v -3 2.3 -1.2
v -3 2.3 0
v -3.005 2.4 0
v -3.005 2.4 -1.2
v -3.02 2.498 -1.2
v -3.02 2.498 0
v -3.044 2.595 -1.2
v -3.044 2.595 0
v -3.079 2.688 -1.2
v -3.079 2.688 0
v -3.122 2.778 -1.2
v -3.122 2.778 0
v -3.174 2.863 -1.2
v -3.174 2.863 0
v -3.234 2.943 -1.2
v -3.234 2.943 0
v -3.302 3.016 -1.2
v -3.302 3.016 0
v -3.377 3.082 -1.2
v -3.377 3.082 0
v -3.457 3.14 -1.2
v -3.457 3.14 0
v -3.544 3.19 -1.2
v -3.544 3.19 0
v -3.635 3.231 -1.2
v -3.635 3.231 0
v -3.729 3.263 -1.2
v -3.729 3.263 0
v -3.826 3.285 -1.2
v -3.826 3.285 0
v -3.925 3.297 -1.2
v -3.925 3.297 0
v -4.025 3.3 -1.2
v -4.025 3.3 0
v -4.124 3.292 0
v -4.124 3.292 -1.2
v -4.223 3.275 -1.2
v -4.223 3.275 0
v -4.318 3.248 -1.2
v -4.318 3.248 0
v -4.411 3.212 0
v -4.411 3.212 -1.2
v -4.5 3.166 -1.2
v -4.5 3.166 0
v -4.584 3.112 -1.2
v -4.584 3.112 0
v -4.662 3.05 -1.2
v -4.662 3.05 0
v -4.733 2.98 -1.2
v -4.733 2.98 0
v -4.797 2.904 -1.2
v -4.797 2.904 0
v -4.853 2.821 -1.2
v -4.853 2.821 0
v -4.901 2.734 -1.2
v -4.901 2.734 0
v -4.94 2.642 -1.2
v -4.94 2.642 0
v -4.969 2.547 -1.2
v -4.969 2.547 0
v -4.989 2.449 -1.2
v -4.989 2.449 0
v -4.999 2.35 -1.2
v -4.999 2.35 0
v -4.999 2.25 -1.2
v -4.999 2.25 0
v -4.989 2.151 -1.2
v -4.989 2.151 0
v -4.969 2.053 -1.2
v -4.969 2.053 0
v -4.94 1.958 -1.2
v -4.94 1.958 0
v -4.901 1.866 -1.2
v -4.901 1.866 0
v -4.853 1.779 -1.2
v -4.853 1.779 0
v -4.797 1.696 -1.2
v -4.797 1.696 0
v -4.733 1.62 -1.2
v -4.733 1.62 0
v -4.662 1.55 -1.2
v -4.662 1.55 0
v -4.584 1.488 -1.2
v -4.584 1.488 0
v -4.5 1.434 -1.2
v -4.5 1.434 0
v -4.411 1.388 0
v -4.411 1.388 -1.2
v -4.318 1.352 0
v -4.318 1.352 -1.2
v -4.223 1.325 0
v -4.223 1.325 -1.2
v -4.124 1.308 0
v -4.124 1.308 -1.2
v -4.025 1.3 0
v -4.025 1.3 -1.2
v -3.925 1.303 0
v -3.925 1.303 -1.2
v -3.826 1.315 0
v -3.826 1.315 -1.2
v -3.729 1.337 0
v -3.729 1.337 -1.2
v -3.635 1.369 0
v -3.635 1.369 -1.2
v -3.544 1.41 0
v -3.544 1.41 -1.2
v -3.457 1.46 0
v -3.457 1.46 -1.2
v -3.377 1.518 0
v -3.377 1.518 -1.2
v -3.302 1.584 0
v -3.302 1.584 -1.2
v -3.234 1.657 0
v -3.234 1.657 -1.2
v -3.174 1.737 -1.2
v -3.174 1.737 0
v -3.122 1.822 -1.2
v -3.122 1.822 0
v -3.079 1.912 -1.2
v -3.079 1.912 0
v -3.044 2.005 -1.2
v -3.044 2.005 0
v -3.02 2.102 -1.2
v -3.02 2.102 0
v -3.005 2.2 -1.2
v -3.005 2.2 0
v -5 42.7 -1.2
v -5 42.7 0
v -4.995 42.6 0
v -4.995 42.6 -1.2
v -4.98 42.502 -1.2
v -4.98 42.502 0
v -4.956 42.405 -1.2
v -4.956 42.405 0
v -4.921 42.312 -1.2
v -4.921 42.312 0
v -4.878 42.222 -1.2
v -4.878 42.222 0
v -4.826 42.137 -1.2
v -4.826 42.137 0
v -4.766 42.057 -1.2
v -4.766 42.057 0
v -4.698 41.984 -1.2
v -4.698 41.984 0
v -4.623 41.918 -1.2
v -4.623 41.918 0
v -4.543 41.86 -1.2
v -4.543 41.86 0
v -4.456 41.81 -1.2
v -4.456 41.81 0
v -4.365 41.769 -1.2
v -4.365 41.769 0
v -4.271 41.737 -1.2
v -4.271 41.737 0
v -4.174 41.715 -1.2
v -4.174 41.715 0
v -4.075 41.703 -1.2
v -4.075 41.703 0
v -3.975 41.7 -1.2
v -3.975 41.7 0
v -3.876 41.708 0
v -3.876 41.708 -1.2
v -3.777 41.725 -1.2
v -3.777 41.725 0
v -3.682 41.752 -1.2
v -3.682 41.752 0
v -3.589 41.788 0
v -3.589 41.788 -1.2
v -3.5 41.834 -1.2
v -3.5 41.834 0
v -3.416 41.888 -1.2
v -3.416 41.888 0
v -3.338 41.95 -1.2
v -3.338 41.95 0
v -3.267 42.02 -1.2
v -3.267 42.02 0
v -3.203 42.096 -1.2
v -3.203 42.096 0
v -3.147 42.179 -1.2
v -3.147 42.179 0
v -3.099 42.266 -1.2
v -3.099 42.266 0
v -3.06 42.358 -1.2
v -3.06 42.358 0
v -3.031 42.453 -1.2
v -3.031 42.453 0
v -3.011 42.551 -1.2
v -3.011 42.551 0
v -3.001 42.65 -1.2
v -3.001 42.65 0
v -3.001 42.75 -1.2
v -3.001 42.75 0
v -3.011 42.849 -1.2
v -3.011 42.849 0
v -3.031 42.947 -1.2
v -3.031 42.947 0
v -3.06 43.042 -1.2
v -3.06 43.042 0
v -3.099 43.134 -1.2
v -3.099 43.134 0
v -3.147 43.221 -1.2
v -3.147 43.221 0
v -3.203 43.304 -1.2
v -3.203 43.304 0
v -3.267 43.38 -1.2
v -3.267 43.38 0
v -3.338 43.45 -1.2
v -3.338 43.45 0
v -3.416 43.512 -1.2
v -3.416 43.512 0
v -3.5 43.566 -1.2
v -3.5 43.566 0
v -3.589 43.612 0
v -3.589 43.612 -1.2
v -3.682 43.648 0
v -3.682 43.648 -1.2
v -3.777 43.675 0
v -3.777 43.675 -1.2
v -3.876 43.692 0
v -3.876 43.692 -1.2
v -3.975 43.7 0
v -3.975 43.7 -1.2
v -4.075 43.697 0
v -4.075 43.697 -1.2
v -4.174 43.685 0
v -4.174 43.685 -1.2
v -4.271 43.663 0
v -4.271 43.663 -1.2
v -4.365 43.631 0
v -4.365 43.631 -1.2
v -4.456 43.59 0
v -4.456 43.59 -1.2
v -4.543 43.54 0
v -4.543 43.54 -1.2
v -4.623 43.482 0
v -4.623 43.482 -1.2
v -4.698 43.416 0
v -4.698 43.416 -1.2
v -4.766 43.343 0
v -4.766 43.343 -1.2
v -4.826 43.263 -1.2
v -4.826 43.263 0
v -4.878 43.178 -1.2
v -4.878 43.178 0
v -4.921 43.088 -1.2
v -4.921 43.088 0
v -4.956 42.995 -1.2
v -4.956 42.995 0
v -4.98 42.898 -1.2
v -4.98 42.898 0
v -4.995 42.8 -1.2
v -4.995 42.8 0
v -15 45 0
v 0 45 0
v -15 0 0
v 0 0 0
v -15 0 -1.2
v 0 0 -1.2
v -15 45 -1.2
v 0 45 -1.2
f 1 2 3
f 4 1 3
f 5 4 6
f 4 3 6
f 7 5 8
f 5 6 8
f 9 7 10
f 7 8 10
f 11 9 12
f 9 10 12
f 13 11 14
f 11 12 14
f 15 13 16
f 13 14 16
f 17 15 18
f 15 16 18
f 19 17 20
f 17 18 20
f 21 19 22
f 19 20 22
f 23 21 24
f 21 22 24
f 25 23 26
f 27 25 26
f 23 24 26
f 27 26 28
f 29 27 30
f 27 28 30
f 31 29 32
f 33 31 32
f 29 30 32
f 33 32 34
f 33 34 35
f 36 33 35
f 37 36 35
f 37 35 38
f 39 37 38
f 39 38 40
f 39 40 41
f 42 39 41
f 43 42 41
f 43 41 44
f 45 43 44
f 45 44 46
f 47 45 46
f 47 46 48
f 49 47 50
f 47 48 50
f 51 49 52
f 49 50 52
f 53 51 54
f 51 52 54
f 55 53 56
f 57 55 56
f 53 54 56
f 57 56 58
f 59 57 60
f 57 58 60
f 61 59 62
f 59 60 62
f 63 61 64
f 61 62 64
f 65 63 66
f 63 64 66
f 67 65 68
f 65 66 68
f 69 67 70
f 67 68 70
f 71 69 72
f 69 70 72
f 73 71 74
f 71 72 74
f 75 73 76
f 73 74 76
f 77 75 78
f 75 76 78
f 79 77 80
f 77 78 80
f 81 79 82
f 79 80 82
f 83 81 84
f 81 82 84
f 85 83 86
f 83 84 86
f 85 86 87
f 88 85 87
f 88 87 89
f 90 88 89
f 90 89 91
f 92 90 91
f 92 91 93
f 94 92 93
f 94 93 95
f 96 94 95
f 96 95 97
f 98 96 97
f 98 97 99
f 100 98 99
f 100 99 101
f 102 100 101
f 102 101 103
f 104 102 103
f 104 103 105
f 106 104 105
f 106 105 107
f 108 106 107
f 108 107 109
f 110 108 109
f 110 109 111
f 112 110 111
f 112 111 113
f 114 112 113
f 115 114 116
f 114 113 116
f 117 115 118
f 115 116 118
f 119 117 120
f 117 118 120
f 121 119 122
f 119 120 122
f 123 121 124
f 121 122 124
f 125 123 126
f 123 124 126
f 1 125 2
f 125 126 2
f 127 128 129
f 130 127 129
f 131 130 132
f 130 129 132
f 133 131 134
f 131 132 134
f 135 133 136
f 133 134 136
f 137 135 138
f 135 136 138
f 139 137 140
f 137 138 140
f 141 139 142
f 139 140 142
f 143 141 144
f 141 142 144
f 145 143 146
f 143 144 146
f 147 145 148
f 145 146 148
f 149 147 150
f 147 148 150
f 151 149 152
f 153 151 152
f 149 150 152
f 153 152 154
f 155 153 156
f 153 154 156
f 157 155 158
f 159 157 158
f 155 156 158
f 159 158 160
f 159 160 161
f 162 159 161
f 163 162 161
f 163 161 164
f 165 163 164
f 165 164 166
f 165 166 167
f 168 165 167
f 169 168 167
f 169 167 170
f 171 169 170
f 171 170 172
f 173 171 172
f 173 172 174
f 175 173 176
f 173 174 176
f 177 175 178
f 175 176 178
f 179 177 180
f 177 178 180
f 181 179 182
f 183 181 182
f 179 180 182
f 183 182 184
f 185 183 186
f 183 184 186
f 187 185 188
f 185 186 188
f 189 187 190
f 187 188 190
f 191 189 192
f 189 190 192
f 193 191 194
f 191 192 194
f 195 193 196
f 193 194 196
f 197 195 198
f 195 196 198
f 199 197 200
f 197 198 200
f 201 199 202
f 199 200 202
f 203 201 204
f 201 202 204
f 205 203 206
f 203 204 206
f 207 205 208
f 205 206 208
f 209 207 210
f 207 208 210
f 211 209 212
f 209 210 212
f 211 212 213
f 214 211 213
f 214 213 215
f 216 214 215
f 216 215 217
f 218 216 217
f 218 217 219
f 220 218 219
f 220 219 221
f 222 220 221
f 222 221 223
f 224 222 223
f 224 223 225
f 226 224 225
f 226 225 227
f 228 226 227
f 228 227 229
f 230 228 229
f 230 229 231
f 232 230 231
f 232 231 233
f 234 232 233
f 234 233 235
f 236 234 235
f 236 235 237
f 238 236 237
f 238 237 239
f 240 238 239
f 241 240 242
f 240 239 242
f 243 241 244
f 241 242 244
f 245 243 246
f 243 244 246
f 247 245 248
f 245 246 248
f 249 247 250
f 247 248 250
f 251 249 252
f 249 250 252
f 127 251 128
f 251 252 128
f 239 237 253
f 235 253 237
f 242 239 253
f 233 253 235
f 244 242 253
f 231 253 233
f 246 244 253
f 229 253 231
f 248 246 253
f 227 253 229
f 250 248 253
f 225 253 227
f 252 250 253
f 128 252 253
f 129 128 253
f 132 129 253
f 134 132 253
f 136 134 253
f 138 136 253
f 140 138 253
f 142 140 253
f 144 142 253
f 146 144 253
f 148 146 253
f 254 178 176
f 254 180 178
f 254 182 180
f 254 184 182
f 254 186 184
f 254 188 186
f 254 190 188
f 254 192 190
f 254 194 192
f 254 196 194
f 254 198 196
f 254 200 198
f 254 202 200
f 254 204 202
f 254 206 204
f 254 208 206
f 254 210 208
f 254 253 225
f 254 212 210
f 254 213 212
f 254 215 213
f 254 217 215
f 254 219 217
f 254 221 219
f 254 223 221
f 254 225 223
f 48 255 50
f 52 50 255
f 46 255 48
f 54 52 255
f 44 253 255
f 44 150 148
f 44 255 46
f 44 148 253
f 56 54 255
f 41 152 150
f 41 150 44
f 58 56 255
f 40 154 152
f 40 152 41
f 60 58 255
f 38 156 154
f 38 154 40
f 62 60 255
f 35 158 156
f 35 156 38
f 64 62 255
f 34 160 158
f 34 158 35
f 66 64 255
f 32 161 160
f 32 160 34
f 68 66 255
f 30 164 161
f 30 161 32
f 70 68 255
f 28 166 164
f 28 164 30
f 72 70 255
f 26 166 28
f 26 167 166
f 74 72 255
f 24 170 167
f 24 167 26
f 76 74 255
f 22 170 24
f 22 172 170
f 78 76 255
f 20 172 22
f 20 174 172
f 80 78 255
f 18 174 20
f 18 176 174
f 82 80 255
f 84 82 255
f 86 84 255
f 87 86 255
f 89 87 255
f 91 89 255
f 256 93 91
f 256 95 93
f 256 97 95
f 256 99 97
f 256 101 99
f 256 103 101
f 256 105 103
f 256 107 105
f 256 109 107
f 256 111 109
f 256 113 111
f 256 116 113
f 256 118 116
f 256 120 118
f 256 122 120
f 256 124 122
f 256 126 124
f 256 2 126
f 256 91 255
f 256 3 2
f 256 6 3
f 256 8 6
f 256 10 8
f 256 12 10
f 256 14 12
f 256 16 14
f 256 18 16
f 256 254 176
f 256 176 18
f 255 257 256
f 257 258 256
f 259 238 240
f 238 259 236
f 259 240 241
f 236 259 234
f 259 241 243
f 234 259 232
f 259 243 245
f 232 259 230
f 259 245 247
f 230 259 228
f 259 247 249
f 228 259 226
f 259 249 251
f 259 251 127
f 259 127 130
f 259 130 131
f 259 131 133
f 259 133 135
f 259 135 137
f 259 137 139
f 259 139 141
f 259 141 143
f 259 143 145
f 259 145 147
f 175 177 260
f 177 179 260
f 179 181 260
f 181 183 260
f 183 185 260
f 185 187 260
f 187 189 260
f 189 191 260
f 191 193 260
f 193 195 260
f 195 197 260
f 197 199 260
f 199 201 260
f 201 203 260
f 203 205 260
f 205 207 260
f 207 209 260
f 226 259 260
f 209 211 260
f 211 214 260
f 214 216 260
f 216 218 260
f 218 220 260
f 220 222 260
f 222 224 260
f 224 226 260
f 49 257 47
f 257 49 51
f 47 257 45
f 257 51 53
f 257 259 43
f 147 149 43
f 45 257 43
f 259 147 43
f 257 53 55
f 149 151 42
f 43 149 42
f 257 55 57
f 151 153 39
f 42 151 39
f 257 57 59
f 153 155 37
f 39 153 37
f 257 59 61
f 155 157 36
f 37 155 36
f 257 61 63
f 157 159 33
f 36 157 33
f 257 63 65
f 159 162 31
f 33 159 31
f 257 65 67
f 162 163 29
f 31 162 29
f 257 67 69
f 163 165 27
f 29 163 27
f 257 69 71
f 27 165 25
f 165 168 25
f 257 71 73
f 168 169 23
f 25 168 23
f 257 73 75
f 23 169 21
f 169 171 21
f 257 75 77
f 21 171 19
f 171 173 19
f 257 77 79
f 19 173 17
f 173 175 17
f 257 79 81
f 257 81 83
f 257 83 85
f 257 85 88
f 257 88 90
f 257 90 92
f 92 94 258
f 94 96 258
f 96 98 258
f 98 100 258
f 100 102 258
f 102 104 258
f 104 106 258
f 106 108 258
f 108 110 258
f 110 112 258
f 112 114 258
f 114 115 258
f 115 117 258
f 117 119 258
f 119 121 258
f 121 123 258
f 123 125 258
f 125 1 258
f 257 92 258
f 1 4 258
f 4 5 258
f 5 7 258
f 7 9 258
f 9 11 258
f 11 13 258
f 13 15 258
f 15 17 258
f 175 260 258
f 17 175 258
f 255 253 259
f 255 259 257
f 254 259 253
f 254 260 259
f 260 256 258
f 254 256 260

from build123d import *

# Parameters (mm, degrees)
SKETCH_1_W      = 45
SKETCH_1_H      = 8
SKETCH_1_R      = 1
EXTRUDE_1_DEPTH = 1.2
SKETCH_3_W      = 45
SKETCH_3_H      = 1.2
EXTRUDE_2_DEPTH = 7


with BuildPart() as part:
    # ｽｹｯﾁ1 → ﾎﾞｽ - 押し出し1 (new body)
    with BuildSketch(Plane(origin=(0, 0, 0), x_dir=(0, 1, 0), z_dir=(0, 0, 1))):
        with Locations((22.5, 4)):
            Rectangle(SKETCH_1_W, SKETCH_1_H)
        with Locations(Location((2.3, 4, 0), (0, 0, 270))):
            Circle(SKETCH_1_R, mode=Mode.SUBTRACT)
        with Locations(Location((42.7, 4, 0), (0, 0, 90))):
            Circle(SKETCH_1_R, mode=Mode.SUBTRACT)
    extrude(amount=-EXTRUDE_1_DEPTH)

    # ｽｹｯﾁ3 → ﾎﾞｽ - 押し出し2 (add)
    with BuildSketch(Plane(origin=(-8, 0, 0), x_dir=(0, -1, 0), z_dir=(-1, 0, 0))):
        with Locations((-22.5, -0.6)):
            Rectangle(SKETCH_3_W, SKETCH_3_H)
    extrude(amount=EXTRUDE_2_DEPTH)


solid = part.part
